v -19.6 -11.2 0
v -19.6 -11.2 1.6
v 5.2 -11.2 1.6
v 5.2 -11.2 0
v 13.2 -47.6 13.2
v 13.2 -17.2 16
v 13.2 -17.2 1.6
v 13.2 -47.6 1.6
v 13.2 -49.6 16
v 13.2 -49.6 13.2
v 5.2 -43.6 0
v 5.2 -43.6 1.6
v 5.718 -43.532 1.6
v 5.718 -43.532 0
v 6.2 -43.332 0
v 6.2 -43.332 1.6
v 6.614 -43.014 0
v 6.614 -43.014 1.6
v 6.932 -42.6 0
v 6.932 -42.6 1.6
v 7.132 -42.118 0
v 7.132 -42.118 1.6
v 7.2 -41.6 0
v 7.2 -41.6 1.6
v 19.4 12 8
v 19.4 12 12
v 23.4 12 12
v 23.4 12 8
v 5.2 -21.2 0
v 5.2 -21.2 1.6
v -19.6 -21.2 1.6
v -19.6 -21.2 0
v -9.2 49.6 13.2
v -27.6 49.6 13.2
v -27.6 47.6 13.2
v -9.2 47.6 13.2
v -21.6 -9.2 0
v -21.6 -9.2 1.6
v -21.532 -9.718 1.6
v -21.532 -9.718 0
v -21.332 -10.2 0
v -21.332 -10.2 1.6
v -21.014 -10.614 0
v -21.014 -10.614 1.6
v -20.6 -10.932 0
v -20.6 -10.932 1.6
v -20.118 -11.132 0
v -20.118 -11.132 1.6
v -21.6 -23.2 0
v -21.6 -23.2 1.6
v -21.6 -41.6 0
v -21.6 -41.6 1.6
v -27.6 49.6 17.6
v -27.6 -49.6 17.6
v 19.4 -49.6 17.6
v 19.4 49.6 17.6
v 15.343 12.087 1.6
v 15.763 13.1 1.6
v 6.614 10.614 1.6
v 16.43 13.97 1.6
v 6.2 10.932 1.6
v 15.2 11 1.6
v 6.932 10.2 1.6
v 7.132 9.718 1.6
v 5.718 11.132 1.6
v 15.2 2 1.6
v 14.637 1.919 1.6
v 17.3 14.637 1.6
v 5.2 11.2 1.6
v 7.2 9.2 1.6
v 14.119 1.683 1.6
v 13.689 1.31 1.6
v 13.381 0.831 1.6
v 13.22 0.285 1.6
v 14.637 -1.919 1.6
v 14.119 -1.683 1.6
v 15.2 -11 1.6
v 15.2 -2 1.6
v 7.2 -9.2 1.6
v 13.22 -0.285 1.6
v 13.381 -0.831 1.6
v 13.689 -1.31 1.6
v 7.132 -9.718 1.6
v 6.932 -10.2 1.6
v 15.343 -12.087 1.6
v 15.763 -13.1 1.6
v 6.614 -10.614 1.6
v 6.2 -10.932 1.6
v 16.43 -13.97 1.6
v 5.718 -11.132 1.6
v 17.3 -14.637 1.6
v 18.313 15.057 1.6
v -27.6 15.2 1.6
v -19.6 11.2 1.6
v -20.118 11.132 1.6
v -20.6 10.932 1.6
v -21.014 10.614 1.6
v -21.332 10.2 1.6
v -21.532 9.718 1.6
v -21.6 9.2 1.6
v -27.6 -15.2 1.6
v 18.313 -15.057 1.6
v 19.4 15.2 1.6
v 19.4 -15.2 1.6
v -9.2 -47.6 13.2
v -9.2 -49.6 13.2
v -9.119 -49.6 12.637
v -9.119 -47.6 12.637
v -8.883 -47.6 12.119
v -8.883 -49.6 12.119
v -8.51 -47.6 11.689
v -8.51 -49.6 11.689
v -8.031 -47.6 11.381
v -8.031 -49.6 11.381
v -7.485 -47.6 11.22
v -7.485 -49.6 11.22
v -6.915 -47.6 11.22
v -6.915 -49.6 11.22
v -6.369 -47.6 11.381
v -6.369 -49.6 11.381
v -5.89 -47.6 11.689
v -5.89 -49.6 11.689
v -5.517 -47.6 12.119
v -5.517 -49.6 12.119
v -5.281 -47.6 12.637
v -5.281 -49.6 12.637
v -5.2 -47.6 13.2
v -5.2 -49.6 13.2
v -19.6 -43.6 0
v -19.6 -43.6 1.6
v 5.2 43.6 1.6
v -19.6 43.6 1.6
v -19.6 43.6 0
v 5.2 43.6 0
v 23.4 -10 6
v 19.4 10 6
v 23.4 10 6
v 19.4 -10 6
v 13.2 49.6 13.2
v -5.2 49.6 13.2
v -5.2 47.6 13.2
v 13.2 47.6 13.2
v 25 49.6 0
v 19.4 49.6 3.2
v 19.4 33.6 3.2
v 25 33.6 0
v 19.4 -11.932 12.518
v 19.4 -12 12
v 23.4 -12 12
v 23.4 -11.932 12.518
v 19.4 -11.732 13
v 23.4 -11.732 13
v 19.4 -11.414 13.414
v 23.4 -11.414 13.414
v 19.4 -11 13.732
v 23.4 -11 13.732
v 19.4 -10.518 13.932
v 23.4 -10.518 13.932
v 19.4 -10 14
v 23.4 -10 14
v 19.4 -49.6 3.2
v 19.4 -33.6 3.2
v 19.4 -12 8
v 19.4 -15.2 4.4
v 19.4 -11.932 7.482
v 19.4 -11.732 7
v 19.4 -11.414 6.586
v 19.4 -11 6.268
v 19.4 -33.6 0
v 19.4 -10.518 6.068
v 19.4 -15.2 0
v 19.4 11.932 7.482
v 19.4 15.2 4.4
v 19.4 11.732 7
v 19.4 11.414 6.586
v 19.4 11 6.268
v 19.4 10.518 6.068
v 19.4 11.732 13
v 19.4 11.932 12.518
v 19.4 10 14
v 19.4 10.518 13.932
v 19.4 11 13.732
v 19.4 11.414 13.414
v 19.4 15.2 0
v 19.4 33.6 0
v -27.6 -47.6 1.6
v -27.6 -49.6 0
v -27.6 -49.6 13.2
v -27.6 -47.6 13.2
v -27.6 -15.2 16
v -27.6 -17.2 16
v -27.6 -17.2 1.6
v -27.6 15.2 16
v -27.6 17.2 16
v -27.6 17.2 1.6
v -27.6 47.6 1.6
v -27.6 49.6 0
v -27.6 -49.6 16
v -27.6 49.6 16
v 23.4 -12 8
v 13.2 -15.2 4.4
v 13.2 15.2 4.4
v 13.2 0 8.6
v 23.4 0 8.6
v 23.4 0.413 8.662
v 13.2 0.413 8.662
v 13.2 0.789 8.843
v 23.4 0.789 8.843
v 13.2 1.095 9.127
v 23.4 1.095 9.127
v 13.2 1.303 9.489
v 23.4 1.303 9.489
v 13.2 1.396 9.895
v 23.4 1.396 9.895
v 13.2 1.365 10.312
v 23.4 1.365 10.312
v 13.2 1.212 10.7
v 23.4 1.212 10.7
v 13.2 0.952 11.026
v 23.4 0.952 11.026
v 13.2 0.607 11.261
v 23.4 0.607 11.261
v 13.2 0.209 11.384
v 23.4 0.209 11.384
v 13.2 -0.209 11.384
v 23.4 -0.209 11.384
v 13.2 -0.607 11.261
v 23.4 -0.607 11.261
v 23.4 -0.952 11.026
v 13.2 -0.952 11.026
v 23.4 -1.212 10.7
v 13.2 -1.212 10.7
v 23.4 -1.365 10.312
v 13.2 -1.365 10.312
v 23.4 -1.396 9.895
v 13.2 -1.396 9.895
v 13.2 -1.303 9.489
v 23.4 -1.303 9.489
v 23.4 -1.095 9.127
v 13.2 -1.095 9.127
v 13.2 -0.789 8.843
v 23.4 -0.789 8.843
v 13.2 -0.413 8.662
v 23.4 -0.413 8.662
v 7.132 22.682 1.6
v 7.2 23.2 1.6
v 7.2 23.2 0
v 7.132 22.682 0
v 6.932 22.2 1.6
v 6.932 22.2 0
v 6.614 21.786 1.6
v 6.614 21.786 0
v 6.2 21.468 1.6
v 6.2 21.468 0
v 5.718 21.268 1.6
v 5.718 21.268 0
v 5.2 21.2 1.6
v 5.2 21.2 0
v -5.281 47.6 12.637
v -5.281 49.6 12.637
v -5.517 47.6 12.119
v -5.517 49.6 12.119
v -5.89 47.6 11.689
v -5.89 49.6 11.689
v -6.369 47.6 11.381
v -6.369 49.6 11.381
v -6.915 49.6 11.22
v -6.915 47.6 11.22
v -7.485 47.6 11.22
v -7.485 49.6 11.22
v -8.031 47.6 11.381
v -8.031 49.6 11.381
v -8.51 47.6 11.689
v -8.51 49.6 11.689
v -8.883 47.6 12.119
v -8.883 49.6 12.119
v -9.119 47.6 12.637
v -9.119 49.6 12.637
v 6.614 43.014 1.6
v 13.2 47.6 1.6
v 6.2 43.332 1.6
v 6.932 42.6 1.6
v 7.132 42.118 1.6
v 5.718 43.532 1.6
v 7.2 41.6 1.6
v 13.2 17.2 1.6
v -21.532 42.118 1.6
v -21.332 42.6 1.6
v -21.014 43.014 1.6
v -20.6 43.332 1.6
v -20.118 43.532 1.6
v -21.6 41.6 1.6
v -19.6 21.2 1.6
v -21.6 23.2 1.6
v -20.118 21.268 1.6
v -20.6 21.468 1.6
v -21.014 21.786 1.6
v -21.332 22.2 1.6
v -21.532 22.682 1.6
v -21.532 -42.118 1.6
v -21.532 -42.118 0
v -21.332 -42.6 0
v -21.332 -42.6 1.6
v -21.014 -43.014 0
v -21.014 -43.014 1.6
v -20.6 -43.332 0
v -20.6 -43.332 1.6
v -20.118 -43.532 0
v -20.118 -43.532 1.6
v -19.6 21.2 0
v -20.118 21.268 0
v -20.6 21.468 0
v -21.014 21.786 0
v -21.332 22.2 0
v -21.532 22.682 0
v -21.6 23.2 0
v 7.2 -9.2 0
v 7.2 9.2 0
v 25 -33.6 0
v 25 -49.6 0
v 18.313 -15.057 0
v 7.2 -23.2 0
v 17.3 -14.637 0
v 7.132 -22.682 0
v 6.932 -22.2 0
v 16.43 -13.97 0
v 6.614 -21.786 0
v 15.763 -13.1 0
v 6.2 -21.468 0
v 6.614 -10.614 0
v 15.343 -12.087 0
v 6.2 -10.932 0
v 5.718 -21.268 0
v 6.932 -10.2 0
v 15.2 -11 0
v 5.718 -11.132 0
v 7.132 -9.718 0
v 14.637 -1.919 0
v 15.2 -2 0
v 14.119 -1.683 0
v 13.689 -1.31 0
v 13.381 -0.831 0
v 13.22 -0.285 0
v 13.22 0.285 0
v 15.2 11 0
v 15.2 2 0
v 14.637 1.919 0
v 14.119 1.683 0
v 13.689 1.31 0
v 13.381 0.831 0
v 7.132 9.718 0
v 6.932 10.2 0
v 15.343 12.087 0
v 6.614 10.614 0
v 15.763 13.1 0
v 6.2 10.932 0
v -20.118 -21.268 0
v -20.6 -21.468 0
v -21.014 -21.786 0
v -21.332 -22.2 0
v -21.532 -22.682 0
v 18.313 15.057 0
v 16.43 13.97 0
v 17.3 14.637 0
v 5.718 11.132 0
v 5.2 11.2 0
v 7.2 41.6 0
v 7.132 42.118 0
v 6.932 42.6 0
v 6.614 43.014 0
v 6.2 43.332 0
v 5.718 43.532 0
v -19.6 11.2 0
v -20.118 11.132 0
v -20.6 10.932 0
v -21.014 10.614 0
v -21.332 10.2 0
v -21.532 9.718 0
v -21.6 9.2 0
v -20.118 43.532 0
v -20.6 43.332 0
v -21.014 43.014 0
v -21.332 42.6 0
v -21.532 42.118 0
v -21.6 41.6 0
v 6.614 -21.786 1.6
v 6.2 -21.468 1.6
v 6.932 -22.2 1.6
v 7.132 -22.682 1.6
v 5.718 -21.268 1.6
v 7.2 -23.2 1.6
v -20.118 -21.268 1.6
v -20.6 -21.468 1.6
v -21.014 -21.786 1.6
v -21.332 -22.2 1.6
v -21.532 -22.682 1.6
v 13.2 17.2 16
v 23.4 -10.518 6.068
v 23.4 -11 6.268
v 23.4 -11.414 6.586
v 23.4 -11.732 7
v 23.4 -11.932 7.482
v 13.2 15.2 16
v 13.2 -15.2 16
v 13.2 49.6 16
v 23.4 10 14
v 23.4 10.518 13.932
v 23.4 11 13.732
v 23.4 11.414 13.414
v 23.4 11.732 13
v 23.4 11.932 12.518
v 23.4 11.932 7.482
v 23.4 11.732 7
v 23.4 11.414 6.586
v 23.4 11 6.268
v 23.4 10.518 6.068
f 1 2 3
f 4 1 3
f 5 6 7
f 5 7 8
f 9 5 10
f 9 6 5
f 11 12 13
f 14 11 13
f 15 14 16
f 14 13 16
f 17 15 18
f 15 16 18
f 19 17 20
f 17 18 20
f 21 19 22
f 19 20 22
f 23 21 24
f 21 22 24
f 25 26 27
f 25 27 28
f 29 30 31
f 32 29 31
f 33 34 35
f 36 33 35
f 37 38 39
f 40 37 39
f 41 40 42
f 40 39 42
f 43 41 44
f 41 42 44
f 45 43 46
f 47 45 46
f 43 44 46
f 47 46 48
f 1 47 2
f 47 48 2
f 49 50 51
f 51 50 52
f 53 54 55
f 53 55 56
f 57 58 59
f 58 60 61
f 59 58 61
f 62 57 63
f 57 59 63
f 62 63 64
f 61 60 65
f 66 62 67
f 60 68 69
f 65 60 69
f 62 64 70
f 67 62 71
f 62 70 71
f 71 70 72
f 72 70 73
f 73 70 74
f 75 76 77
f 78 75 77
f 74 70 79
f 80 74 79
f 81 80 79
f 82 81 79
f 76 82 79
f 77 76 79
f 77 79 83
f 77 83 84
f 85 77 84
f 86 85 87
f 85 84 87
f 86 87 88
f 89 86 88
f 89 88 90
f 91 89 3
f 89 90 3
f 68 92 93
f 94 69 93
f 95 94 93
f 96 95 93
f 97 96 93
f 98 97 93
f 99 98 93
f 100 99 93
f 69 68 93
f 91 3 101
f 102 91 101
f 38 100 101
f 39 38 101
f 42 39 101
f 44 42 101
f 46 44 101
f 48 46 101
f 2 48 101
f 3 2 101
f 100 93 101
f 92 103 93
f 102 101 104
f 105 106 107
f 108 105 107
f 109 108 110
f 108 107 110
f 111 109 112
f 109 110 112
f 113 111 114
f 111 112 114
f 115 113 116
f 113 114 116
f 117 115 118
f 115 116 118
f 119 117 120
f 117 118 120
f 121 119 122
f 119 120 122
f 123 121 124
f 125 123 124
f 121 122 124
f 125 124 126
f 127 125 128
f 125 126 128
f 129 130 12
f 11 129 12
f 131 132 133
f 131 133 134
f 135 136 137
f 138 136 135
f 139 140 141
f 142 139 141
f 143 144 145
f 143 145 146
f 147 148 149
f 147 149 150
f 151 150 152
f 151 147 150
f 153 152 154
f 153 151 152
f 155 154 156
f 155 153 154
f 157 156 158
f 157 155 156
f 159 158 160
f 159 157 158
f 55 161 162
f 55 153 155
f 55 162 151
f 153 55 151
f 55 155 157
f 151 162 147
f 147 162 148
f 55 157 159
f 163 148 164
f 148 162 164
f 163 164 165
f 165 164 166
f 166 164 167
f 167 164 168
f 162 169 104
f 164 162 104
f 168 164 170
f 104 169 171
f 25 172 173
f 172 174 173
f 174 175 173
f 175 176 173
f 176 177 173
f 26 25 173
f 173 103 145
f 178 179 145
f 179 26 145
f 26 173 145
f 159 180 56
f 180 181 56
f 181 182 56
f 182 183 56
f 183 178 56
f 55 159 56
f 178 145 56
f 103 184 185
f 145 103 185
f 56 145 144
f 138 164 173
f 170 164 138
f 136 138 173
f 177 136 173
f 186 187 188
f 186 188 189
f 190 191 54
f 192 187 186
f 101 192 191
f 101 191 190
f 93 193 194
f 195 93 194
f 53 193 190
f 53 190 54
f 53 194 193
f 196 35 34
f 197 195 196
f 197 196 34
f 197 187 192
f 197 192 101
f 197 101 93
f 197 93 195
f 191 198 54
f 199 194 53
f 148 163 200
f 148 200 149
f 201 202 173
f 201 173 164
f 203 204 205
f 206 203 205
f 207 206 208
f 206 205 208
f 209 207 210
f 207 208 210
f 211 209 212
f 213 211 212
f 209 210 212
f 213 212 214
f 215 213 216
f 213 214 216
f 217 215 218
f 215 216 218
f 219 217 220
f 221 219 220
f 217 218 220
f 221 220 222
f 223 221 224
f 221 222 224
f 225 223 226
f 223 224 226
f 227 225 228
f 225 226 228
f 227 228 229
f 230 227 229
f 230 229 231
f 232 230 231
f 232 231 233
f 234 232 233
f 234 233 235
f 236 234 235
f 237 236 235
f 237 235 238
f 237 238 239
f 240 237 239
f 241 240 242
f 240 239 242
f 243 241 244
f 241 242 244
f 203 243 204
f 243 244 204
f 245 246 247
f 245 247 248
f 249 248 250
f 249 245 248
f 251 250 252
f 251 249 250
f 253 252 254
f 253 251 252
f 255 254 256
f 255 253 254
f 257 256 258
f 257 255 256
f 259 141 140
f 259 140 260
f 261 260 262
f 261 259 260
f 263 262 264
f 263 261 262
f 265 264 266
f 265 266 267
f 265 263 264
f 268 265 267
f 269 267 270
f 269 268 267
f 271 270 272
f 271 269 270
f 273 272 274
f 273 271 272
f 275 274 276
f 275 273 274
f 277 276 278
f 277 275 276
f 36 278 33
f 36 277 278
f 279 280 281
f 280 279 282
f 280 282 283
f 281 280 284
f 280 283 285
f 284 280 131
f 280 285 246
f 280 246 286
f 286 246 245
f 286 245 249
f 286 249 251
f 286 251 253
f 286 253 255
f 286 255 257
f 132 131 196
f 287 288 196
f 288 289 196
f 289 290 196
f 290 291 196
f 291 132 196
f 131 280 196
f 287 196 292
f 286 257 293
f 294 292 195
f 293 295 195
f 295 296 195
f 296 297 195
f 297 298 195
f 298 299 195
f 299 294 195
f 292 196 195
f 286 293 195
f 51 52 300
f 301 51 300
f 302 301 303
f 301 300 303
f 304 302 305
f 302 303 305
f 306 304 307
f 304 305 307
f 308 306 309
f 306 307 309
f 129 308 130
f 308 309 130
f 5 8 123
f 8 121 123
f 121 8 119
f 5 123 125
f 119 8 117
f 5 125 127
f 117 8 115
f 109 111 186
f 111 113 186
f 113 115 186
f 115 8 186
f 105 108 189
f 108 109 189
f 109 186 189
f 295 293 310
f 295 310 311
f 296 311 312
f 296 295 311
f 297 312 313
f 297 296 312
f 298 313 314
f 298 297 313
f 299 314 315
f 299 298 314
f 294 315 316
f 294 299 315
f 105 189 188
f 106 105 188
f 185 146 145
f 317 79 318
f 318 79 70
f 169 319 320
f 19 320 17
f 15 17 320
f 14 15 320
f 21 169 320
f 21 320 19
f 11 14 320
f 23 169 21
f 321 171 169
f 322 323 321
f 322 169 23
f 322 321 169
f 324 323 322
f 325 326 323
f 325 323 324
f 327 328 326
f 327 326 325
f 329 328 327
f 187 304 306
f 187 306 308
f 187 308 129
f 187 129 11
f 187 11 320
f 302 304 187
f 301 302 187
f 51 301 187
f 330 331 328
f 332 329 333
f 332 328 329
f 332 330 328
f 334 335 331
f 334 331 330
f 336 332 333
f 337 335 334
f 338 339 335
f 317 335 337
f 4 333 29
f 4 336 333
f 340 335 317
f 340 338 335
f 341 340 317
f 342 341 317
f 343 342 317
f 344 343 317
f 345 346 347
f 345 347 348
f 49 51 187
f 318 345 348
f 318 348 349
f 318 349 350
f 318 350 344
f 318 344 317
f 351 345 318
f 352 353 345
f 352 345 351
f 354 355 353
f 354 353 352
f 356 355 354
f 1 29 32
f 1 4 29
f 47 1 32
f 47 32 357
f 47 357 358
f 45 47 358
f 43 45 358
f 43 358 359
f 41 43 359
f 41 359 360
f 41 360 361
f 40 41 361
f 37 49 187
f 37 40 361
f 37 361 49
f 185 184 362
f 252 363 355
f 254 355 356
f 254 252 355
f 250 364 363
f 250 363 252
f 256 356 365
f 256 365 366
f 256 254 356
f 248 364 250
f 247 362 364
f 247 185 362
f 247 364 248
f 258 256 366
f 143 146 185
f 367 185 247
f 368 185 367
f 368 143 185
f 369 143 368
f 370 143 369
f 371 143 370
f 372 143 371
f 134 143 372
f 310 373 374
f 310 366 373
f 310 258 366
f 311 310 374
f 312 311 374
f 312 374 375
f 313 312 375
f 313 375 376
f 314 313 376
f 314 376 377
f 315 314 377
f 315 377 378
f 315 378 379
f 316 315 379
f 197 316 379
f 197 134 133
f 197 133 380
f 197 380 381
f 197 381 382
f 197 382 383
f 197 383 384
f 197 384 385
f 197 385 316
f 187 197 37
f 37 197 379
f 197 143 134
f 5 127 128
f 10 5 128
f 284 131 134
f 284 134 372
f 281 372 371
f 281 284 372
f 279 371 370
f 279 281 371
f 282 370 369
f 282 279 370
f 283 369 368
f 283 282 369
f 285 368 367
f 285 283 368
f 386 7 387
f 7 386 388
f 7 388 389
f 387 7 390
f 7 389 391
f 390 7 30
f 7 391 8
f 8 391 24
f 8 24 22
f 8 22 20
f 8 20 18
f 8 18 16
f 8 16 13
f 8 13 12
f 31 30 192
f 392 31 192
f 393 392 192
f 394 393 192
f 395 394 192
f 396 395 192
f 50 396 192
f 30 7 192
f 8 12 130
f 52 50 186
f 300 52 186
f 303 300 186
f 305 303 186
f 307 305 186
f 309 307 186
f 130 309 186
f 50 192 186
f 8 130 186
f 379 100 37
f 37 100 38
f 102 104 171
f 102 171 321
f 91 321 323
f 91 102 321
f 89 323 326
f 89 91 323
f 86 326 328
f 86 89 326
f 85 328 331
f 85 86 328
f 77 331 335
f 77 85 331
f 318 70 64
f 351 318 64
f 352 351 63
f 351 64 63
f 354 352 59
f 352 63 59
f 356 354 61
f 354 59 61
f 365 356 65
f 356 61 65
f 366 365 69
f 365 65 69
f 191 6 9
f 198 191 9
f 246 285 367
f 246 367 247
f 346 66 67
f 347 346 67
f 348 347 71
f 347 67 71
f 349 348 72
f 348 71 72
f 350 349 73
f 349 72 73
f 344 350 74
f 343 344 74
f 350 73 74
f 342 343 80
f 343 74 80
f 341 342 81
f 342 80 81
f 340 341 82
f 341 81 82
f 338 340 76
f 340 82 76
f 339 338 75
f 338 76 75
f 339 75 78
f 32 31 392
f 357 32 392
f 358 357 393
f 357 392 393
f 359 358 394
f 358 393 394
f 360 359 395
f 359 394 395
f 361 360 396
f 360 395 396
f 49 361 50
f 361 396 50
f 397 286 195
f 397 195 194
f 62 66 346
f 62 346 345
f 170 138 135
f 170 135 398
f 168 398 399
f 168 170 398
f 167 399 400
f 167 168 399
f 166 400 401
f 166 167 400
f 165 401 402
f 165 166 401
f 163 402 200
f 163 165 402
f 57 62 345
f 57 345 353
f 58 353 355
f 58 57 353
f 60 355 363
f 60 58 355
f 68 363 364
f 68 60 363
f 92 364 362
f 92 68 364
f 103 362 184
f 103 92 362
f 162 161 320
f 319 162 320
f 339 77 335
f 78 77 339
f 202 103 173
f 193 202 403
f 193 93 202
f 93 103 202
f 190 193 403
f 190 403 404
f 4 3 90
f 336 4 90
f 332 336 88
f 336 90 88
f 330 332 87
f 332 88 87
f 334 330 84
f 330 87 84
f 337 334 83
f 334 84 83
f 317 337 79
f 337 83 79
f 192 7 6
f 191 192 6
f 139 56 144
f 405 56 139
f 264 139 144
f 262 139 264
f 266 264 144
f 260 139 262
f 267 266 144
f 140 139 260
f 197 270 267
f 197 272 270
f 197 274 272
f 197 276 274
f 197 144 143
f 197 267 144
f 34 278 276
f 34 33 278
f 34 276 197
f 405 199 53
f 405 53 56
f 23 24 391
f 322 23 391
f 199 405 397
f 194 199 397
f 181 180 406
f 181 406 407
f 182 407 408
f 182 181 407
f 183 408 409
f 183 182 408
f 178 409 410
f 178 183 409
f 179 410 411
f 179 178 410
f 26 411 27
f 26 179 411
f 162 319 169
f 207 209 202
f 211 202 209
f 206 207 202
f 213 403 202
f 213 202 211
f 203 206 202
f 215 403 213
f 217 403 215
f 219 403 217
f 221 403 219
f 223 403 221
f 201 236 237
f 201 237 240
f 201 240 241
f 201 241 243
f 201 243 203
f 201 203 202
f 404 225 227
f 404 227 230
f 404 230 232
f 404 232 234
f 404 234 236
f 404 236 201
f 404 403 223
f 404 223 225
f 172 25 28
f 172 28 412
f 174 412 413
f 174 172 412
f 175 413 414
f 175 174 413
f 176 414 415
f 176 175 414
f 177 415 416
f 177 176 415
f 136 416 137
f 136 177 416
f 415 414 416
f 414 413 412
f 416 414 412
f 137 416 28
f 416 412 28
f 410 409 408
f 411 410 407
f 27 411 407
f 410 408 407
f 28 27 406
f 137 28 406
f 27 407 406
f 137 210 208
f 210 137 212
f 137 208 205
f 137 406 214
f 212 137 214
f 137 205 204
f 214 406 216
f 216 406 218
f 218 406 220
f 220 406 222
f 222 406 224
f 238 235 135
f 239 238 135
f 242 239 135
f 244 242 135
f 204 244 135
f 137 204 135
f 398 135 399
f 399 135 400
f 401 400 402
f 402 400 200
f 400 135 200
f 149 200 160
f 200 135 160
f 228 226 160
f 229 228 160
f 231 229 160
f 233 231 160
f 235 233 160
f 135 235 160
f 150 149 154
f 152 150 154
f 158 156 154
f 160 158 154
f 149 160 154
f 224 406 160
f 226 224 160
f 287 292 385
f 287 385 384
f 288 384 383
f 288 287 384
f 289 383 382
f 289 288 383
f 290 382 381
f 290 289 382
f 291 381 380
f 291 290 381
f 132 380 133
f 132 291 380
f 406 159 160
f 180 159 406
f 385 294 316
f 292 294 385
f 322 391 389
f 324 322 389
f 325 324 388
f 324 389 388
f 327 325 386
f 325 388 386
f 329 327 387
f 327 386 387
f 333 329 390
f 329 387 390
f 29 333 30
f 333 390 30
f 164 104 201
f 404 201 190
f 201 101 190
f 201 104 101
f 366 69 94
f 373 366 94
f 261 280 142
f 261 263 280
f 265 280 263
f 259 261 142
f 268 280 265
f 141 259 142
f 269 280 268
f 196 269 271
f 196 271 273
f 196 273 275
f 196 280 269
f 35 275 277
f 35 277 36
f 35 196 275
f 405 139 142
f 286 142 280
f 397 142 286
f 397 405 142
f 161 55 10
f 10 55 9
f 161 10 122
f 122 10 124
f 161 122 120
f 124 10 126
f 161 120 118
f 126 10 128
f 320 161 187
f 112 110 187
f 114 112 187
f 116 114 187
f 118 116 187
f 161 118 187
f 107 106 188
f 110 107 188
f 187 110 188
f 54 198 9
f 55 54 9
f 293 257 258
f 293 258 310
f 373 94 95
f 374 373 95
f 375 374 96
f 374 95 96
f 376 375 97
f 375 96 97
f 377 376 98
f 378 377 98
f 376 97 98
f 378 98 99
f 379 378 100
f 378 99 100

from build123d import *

# Parameters (mm, degrees)
CROQUIS1_W             = 99.2
CROQUIS1_H             = 47
BASE_DEPTH             = 17.6
CROQUIS2_W             = 30.4
CROQUIS2_H             = 14.4
PLATES_DEPTH           = 40.8
CROQUIS4_W             = 2
CROQUIS4_H             = 2.8
WINDOW_LATERAL_1_DEPTH = 40.8
CROQUIS5_R             = 2
WINDOW_LATERAL_2_DEPTH = 2
WINDOW_LATERAL_3_START = -2
WINDOW_LATERAL_3_DEPTH = 2
CROQUIS7_W             = 30.4
CROQUIS7_H             = 2.8
WINDOW_BEHIND_1_DEPTH  = 6.2
WINDOW_BEHIND_2_DEPTH  = 59.973892529
CROQUIS9_R             = 2
WINDOW_BEHIND_3_DEPTH  = 59.973892529
WINDOW_BOTTOM_DEPTH    = 59.973892529
ROTOR_JOIN_1_DEPTH     = 4
CROQUIS12_R            = 1.4
ROTOR_JOIN_2_DEPTH     = 10.2
ROTOR_LIMIT_1_DEPTH    = 16
ROTOR_LIMIT_2_DEPTH    = 16


with BuildPart() as part:
    # Croquis1 → BASE (new body)
    with BuildSketch(Plane(origin=(0, 0, 0), x_dir=(0, 1, 0), z_dir=(0, 0, 1))):
        with Locations((0, 4.1)):
            Rectangle(CROQUIS1_W, CROQUIS1_H)
    extrude(amount=BASE_DEPTH)

    # Croquis2 → PLATES (cut)
    with BuildSketch(Plane(origin=(-27.6, 0, 0), x_dir=(0, -1, 0), z_dir=(-1, 0, 0))):
        with Locations((-32.4, 8.8)):
            Rectangle(CROQUIS2_W, CROQUIS2_H)
        with Locations((0, 8.8)):
            Rectangle(CROQUIS2_W, CROQUIS2_H)
        with Locations((32.4, 8.8)):
            Rectangle(CROQUIS2_W, CROQUIS2_H)
    extrude(amount=-PLATES_DEPTH, mode=Mode.SUBTRACT)

    # Croquis4 → WINDOW_LATERAL_1 (cut)
    with BuildSketch(Plane(origin=(-27.6, 0, 0), x_dir=(0, -1, 0), z_dir=(-1, 0, 0))):
        with Locations((48.6, 14.6)):
            Rectangle(CROQUIS4_W, CROQUIS4_H)
        with Locations((-48.6, 14.6)):
            Rectangle(CROQUIS4_W, CROQUIS4_H)
    extrude(amount=-WINDOW_LATERAL_1_DEPTH, mode=Mode.SUBTRACT)

    # Croquis5 → WINDOW_LATERAL_2 (cut)
    with BuildSketch(Plane.XZ.offset(49.6)):
        with Locations((-7.2, 13.2)):
            Circle(CROQUIS5_R)
    extrude(amount=-WINDOW_LATERAL_2_DEPTH, mode=Mode.SUBTRACT)

    # Croquis6 → WINDOW_LATERAL_3 (cut)
    with BuildSketch(Plane(origin=(0, 49.6, 0), x_dir=(-1, 0, 0), z_dir=(0, 1, 0)).offset(WINDOW_LATERAL_3_START)):
        with BuildLine():
            Line((9.2, 13.2), (5.2, 13.2))
            ThreePointArc((5.2, 13.2), (7.2, 11.2), (9.2, 13.2))
        make_face()
    extrude(amount=WINDOW_LATERAL_3_DEPTH, mode=Mode.SUBTRACT)

    # Croquis7 → WINDOW_BEHIND_1 (cut)
    with BuildSketch(Plane(origin=(13.2, 0, 0), x_dir=(0, -1, 0), z_dir=(-1, 0, 0))):
        with Locations((0, 3)):
            Rectangle(CROQUIS7_W, CROQUIS7_H)
    extrude(amount=-WINDOW_BEHIND_1_DEPTH, mode=Mode.SUBTRACT)

    # Croquis8 → WINDOW_BEHIND_2 (cut, through all)
    with BuildSketch(Plane.XY.offset(1.6)):
        with BuildLine():
            Line((15.2, -11), (15.2, 11))
            ThreePointArc((15.2, 11), (19.4, 15.2), (23.6, 11))
            Line((23.6, 11), (23.6, -11))
            ThreePointArc((23.6, -11), (19.4, -15.2), (15.2, -11))
        make_face()
    extrude(amount=-WINDOW_BEHIND_2_DEPTH, mode=Mode.SUBTRACT)

    # Croquis9 → WINDOW_BEHIND_3 (cut, through all)
    with BuildSketch(Plane.XY.offset(1.6)):
        with Locations((15.2, 0)):
            Circle(CROQUIS9_R)
    extrude(amount=-WINDOW_BEHIND_3_DEPTH, mode=Mode.SUBTRACT)

    # Croquis10 → WINDOW_BOTTOM (cut, through all)
    with BuildSketch(Plane.XY.offset(1.6)):
        with BuildLine():
            Line((5.2, 11.2), (-19.6, 11.2))
            ThreePointArc((-19.6, 11.2), (-21.014213562, 10.614213562), (-21.6, 9.2))
            Line((-21.6, 9.2), (-21.6, -9.2))
            ThreePointArc((-21.6, -9.2), (-21.014213562, -10.614213562), (-19.6, -11.2))
            Line((-19.6, -11.2), (5.2, -11.2))
            ThreePointArc((5.2, -11.2), (6.614213562, -10.614213562), (7.2, -9.2))
            Line((7.2, -9.2), (7.2, 9.2))
            ThreePointArc((7.2, 9.2), (6.614213562, 10.614213562), (5.2, 11.2))
        make_face()
        with BuildLine():
            Line((7.2, 41.6), (7.2, 23.2))
            ThreePointArc((7.2, 23.2), (6.614213562, 21.785786438), (5.2, 21.2))
            Line((5.2, 21.2), (-19.6, 21.2))
            ThreePointArc((-19.6, 21.2), (-21.014213562, 21.785786438), (-21.6, 23.2))
            Line((-21.6, 23.2), (-21.6, 41.6))
            ThreePointArc((-21.6, 41.6), (-21.014213562, 43.014213562), (-19.6, 43.6))
            Line((-19.6, 43.6), (5.2, 43.6))
            ThreePointArc((5.2, 43.6), (6.614213562, 43.014213562), (7.2, 41.6))
        make_face()
        with BuildLine():
            Line((5.2, -21.2), (-19.6, -21.2))
            ThreePointArc((-19.6, -21.2), (-21.014213562, -21.785786438), (-21.6, -23.2))
            Line((-21.6, -23.2), (-21.6, -41.6))
            ThreePointArc((-21.6, -41.6), (-21.014213562, -43.014213562), (-19.6, -43.6))
            Line((-19.6, -43.6), (5.2, -43.6))
            ThreePointArc((5.2, -43.6), (6.614213562, -43.014213562), (7.2, -41.6))
            Line((7.2, -41.6), (7.2, -23.2))
            ThreePointArc((7.2, -23.2), (6.614213562, -21.785786438), (5.2, -21.2))
        make_face()
    extrude(amount=-WINDOW_BOTTOM_DEPTH, mode=Mode.SUBTRACT)

    # Croquis11 → ROTOR_JOIN_1 (add)
    with BuildSketch(Plane.YZ.offset(19.4)):
        with BuildLine():
            Line((-10, 14), (10, 14))
            ThreePointArc((10, 14), (11.414213562, 13.414213562), (12, 12))
            Line((12, 12), (12, 8))
            ThreePointArc((12, 8), (11.414213562, 6.585786438), (10, 6))
            Line((10, 6), (-10, 6))
            ThreePointArc((-10, 6), (-11.414213562, 6.585786438), (-12, 8))
            Line((-12, 8), (-12, 12))
            ThreePointArc((-12, 12), (-11.414213562, 13.414213562), (-10, 14))
        make_face()
    extrude(amount=ROTOR_JOIN_1_DEPTH)

    # Croquis12 → ROTOR_JOIN_2 (cut)
    with BuildSketch(Plane.YZ.offset(23.4)):
        with Locations(Location((0, 10, 0), (0, 0, 270))):
            Circle(CROQUIS12_R)
    extrude(amount=-ROTOR_JOIN_2_DEPTH, mode=Mode.SUBTRACT)

    # Croquis14 → ROTOR_LIMIT_1 (add)
    with BuildSketch(Plane.XZ.offset(49.6)):
        Polygon((19.4, 0), (19.4, 3.2), (25, 0), align=None)
    extrude(amount=-ROTOR_LIMIT_1_DEPTH)

    # Croquis15 → ROTOR_LIMIT_2 (add)
    with BuildSketch(Plane(origin=(0, 49.6, 0), x_dir=(-1, 0, 0), z_dir=(0, 1, 0))):
        Polygon((-25, 0), (-19.4, 0), (-19.4, 3.2), align=None)
    extrude(amount=-ROTOR_LIMIT_2_DEPTH)


solid = part.part
